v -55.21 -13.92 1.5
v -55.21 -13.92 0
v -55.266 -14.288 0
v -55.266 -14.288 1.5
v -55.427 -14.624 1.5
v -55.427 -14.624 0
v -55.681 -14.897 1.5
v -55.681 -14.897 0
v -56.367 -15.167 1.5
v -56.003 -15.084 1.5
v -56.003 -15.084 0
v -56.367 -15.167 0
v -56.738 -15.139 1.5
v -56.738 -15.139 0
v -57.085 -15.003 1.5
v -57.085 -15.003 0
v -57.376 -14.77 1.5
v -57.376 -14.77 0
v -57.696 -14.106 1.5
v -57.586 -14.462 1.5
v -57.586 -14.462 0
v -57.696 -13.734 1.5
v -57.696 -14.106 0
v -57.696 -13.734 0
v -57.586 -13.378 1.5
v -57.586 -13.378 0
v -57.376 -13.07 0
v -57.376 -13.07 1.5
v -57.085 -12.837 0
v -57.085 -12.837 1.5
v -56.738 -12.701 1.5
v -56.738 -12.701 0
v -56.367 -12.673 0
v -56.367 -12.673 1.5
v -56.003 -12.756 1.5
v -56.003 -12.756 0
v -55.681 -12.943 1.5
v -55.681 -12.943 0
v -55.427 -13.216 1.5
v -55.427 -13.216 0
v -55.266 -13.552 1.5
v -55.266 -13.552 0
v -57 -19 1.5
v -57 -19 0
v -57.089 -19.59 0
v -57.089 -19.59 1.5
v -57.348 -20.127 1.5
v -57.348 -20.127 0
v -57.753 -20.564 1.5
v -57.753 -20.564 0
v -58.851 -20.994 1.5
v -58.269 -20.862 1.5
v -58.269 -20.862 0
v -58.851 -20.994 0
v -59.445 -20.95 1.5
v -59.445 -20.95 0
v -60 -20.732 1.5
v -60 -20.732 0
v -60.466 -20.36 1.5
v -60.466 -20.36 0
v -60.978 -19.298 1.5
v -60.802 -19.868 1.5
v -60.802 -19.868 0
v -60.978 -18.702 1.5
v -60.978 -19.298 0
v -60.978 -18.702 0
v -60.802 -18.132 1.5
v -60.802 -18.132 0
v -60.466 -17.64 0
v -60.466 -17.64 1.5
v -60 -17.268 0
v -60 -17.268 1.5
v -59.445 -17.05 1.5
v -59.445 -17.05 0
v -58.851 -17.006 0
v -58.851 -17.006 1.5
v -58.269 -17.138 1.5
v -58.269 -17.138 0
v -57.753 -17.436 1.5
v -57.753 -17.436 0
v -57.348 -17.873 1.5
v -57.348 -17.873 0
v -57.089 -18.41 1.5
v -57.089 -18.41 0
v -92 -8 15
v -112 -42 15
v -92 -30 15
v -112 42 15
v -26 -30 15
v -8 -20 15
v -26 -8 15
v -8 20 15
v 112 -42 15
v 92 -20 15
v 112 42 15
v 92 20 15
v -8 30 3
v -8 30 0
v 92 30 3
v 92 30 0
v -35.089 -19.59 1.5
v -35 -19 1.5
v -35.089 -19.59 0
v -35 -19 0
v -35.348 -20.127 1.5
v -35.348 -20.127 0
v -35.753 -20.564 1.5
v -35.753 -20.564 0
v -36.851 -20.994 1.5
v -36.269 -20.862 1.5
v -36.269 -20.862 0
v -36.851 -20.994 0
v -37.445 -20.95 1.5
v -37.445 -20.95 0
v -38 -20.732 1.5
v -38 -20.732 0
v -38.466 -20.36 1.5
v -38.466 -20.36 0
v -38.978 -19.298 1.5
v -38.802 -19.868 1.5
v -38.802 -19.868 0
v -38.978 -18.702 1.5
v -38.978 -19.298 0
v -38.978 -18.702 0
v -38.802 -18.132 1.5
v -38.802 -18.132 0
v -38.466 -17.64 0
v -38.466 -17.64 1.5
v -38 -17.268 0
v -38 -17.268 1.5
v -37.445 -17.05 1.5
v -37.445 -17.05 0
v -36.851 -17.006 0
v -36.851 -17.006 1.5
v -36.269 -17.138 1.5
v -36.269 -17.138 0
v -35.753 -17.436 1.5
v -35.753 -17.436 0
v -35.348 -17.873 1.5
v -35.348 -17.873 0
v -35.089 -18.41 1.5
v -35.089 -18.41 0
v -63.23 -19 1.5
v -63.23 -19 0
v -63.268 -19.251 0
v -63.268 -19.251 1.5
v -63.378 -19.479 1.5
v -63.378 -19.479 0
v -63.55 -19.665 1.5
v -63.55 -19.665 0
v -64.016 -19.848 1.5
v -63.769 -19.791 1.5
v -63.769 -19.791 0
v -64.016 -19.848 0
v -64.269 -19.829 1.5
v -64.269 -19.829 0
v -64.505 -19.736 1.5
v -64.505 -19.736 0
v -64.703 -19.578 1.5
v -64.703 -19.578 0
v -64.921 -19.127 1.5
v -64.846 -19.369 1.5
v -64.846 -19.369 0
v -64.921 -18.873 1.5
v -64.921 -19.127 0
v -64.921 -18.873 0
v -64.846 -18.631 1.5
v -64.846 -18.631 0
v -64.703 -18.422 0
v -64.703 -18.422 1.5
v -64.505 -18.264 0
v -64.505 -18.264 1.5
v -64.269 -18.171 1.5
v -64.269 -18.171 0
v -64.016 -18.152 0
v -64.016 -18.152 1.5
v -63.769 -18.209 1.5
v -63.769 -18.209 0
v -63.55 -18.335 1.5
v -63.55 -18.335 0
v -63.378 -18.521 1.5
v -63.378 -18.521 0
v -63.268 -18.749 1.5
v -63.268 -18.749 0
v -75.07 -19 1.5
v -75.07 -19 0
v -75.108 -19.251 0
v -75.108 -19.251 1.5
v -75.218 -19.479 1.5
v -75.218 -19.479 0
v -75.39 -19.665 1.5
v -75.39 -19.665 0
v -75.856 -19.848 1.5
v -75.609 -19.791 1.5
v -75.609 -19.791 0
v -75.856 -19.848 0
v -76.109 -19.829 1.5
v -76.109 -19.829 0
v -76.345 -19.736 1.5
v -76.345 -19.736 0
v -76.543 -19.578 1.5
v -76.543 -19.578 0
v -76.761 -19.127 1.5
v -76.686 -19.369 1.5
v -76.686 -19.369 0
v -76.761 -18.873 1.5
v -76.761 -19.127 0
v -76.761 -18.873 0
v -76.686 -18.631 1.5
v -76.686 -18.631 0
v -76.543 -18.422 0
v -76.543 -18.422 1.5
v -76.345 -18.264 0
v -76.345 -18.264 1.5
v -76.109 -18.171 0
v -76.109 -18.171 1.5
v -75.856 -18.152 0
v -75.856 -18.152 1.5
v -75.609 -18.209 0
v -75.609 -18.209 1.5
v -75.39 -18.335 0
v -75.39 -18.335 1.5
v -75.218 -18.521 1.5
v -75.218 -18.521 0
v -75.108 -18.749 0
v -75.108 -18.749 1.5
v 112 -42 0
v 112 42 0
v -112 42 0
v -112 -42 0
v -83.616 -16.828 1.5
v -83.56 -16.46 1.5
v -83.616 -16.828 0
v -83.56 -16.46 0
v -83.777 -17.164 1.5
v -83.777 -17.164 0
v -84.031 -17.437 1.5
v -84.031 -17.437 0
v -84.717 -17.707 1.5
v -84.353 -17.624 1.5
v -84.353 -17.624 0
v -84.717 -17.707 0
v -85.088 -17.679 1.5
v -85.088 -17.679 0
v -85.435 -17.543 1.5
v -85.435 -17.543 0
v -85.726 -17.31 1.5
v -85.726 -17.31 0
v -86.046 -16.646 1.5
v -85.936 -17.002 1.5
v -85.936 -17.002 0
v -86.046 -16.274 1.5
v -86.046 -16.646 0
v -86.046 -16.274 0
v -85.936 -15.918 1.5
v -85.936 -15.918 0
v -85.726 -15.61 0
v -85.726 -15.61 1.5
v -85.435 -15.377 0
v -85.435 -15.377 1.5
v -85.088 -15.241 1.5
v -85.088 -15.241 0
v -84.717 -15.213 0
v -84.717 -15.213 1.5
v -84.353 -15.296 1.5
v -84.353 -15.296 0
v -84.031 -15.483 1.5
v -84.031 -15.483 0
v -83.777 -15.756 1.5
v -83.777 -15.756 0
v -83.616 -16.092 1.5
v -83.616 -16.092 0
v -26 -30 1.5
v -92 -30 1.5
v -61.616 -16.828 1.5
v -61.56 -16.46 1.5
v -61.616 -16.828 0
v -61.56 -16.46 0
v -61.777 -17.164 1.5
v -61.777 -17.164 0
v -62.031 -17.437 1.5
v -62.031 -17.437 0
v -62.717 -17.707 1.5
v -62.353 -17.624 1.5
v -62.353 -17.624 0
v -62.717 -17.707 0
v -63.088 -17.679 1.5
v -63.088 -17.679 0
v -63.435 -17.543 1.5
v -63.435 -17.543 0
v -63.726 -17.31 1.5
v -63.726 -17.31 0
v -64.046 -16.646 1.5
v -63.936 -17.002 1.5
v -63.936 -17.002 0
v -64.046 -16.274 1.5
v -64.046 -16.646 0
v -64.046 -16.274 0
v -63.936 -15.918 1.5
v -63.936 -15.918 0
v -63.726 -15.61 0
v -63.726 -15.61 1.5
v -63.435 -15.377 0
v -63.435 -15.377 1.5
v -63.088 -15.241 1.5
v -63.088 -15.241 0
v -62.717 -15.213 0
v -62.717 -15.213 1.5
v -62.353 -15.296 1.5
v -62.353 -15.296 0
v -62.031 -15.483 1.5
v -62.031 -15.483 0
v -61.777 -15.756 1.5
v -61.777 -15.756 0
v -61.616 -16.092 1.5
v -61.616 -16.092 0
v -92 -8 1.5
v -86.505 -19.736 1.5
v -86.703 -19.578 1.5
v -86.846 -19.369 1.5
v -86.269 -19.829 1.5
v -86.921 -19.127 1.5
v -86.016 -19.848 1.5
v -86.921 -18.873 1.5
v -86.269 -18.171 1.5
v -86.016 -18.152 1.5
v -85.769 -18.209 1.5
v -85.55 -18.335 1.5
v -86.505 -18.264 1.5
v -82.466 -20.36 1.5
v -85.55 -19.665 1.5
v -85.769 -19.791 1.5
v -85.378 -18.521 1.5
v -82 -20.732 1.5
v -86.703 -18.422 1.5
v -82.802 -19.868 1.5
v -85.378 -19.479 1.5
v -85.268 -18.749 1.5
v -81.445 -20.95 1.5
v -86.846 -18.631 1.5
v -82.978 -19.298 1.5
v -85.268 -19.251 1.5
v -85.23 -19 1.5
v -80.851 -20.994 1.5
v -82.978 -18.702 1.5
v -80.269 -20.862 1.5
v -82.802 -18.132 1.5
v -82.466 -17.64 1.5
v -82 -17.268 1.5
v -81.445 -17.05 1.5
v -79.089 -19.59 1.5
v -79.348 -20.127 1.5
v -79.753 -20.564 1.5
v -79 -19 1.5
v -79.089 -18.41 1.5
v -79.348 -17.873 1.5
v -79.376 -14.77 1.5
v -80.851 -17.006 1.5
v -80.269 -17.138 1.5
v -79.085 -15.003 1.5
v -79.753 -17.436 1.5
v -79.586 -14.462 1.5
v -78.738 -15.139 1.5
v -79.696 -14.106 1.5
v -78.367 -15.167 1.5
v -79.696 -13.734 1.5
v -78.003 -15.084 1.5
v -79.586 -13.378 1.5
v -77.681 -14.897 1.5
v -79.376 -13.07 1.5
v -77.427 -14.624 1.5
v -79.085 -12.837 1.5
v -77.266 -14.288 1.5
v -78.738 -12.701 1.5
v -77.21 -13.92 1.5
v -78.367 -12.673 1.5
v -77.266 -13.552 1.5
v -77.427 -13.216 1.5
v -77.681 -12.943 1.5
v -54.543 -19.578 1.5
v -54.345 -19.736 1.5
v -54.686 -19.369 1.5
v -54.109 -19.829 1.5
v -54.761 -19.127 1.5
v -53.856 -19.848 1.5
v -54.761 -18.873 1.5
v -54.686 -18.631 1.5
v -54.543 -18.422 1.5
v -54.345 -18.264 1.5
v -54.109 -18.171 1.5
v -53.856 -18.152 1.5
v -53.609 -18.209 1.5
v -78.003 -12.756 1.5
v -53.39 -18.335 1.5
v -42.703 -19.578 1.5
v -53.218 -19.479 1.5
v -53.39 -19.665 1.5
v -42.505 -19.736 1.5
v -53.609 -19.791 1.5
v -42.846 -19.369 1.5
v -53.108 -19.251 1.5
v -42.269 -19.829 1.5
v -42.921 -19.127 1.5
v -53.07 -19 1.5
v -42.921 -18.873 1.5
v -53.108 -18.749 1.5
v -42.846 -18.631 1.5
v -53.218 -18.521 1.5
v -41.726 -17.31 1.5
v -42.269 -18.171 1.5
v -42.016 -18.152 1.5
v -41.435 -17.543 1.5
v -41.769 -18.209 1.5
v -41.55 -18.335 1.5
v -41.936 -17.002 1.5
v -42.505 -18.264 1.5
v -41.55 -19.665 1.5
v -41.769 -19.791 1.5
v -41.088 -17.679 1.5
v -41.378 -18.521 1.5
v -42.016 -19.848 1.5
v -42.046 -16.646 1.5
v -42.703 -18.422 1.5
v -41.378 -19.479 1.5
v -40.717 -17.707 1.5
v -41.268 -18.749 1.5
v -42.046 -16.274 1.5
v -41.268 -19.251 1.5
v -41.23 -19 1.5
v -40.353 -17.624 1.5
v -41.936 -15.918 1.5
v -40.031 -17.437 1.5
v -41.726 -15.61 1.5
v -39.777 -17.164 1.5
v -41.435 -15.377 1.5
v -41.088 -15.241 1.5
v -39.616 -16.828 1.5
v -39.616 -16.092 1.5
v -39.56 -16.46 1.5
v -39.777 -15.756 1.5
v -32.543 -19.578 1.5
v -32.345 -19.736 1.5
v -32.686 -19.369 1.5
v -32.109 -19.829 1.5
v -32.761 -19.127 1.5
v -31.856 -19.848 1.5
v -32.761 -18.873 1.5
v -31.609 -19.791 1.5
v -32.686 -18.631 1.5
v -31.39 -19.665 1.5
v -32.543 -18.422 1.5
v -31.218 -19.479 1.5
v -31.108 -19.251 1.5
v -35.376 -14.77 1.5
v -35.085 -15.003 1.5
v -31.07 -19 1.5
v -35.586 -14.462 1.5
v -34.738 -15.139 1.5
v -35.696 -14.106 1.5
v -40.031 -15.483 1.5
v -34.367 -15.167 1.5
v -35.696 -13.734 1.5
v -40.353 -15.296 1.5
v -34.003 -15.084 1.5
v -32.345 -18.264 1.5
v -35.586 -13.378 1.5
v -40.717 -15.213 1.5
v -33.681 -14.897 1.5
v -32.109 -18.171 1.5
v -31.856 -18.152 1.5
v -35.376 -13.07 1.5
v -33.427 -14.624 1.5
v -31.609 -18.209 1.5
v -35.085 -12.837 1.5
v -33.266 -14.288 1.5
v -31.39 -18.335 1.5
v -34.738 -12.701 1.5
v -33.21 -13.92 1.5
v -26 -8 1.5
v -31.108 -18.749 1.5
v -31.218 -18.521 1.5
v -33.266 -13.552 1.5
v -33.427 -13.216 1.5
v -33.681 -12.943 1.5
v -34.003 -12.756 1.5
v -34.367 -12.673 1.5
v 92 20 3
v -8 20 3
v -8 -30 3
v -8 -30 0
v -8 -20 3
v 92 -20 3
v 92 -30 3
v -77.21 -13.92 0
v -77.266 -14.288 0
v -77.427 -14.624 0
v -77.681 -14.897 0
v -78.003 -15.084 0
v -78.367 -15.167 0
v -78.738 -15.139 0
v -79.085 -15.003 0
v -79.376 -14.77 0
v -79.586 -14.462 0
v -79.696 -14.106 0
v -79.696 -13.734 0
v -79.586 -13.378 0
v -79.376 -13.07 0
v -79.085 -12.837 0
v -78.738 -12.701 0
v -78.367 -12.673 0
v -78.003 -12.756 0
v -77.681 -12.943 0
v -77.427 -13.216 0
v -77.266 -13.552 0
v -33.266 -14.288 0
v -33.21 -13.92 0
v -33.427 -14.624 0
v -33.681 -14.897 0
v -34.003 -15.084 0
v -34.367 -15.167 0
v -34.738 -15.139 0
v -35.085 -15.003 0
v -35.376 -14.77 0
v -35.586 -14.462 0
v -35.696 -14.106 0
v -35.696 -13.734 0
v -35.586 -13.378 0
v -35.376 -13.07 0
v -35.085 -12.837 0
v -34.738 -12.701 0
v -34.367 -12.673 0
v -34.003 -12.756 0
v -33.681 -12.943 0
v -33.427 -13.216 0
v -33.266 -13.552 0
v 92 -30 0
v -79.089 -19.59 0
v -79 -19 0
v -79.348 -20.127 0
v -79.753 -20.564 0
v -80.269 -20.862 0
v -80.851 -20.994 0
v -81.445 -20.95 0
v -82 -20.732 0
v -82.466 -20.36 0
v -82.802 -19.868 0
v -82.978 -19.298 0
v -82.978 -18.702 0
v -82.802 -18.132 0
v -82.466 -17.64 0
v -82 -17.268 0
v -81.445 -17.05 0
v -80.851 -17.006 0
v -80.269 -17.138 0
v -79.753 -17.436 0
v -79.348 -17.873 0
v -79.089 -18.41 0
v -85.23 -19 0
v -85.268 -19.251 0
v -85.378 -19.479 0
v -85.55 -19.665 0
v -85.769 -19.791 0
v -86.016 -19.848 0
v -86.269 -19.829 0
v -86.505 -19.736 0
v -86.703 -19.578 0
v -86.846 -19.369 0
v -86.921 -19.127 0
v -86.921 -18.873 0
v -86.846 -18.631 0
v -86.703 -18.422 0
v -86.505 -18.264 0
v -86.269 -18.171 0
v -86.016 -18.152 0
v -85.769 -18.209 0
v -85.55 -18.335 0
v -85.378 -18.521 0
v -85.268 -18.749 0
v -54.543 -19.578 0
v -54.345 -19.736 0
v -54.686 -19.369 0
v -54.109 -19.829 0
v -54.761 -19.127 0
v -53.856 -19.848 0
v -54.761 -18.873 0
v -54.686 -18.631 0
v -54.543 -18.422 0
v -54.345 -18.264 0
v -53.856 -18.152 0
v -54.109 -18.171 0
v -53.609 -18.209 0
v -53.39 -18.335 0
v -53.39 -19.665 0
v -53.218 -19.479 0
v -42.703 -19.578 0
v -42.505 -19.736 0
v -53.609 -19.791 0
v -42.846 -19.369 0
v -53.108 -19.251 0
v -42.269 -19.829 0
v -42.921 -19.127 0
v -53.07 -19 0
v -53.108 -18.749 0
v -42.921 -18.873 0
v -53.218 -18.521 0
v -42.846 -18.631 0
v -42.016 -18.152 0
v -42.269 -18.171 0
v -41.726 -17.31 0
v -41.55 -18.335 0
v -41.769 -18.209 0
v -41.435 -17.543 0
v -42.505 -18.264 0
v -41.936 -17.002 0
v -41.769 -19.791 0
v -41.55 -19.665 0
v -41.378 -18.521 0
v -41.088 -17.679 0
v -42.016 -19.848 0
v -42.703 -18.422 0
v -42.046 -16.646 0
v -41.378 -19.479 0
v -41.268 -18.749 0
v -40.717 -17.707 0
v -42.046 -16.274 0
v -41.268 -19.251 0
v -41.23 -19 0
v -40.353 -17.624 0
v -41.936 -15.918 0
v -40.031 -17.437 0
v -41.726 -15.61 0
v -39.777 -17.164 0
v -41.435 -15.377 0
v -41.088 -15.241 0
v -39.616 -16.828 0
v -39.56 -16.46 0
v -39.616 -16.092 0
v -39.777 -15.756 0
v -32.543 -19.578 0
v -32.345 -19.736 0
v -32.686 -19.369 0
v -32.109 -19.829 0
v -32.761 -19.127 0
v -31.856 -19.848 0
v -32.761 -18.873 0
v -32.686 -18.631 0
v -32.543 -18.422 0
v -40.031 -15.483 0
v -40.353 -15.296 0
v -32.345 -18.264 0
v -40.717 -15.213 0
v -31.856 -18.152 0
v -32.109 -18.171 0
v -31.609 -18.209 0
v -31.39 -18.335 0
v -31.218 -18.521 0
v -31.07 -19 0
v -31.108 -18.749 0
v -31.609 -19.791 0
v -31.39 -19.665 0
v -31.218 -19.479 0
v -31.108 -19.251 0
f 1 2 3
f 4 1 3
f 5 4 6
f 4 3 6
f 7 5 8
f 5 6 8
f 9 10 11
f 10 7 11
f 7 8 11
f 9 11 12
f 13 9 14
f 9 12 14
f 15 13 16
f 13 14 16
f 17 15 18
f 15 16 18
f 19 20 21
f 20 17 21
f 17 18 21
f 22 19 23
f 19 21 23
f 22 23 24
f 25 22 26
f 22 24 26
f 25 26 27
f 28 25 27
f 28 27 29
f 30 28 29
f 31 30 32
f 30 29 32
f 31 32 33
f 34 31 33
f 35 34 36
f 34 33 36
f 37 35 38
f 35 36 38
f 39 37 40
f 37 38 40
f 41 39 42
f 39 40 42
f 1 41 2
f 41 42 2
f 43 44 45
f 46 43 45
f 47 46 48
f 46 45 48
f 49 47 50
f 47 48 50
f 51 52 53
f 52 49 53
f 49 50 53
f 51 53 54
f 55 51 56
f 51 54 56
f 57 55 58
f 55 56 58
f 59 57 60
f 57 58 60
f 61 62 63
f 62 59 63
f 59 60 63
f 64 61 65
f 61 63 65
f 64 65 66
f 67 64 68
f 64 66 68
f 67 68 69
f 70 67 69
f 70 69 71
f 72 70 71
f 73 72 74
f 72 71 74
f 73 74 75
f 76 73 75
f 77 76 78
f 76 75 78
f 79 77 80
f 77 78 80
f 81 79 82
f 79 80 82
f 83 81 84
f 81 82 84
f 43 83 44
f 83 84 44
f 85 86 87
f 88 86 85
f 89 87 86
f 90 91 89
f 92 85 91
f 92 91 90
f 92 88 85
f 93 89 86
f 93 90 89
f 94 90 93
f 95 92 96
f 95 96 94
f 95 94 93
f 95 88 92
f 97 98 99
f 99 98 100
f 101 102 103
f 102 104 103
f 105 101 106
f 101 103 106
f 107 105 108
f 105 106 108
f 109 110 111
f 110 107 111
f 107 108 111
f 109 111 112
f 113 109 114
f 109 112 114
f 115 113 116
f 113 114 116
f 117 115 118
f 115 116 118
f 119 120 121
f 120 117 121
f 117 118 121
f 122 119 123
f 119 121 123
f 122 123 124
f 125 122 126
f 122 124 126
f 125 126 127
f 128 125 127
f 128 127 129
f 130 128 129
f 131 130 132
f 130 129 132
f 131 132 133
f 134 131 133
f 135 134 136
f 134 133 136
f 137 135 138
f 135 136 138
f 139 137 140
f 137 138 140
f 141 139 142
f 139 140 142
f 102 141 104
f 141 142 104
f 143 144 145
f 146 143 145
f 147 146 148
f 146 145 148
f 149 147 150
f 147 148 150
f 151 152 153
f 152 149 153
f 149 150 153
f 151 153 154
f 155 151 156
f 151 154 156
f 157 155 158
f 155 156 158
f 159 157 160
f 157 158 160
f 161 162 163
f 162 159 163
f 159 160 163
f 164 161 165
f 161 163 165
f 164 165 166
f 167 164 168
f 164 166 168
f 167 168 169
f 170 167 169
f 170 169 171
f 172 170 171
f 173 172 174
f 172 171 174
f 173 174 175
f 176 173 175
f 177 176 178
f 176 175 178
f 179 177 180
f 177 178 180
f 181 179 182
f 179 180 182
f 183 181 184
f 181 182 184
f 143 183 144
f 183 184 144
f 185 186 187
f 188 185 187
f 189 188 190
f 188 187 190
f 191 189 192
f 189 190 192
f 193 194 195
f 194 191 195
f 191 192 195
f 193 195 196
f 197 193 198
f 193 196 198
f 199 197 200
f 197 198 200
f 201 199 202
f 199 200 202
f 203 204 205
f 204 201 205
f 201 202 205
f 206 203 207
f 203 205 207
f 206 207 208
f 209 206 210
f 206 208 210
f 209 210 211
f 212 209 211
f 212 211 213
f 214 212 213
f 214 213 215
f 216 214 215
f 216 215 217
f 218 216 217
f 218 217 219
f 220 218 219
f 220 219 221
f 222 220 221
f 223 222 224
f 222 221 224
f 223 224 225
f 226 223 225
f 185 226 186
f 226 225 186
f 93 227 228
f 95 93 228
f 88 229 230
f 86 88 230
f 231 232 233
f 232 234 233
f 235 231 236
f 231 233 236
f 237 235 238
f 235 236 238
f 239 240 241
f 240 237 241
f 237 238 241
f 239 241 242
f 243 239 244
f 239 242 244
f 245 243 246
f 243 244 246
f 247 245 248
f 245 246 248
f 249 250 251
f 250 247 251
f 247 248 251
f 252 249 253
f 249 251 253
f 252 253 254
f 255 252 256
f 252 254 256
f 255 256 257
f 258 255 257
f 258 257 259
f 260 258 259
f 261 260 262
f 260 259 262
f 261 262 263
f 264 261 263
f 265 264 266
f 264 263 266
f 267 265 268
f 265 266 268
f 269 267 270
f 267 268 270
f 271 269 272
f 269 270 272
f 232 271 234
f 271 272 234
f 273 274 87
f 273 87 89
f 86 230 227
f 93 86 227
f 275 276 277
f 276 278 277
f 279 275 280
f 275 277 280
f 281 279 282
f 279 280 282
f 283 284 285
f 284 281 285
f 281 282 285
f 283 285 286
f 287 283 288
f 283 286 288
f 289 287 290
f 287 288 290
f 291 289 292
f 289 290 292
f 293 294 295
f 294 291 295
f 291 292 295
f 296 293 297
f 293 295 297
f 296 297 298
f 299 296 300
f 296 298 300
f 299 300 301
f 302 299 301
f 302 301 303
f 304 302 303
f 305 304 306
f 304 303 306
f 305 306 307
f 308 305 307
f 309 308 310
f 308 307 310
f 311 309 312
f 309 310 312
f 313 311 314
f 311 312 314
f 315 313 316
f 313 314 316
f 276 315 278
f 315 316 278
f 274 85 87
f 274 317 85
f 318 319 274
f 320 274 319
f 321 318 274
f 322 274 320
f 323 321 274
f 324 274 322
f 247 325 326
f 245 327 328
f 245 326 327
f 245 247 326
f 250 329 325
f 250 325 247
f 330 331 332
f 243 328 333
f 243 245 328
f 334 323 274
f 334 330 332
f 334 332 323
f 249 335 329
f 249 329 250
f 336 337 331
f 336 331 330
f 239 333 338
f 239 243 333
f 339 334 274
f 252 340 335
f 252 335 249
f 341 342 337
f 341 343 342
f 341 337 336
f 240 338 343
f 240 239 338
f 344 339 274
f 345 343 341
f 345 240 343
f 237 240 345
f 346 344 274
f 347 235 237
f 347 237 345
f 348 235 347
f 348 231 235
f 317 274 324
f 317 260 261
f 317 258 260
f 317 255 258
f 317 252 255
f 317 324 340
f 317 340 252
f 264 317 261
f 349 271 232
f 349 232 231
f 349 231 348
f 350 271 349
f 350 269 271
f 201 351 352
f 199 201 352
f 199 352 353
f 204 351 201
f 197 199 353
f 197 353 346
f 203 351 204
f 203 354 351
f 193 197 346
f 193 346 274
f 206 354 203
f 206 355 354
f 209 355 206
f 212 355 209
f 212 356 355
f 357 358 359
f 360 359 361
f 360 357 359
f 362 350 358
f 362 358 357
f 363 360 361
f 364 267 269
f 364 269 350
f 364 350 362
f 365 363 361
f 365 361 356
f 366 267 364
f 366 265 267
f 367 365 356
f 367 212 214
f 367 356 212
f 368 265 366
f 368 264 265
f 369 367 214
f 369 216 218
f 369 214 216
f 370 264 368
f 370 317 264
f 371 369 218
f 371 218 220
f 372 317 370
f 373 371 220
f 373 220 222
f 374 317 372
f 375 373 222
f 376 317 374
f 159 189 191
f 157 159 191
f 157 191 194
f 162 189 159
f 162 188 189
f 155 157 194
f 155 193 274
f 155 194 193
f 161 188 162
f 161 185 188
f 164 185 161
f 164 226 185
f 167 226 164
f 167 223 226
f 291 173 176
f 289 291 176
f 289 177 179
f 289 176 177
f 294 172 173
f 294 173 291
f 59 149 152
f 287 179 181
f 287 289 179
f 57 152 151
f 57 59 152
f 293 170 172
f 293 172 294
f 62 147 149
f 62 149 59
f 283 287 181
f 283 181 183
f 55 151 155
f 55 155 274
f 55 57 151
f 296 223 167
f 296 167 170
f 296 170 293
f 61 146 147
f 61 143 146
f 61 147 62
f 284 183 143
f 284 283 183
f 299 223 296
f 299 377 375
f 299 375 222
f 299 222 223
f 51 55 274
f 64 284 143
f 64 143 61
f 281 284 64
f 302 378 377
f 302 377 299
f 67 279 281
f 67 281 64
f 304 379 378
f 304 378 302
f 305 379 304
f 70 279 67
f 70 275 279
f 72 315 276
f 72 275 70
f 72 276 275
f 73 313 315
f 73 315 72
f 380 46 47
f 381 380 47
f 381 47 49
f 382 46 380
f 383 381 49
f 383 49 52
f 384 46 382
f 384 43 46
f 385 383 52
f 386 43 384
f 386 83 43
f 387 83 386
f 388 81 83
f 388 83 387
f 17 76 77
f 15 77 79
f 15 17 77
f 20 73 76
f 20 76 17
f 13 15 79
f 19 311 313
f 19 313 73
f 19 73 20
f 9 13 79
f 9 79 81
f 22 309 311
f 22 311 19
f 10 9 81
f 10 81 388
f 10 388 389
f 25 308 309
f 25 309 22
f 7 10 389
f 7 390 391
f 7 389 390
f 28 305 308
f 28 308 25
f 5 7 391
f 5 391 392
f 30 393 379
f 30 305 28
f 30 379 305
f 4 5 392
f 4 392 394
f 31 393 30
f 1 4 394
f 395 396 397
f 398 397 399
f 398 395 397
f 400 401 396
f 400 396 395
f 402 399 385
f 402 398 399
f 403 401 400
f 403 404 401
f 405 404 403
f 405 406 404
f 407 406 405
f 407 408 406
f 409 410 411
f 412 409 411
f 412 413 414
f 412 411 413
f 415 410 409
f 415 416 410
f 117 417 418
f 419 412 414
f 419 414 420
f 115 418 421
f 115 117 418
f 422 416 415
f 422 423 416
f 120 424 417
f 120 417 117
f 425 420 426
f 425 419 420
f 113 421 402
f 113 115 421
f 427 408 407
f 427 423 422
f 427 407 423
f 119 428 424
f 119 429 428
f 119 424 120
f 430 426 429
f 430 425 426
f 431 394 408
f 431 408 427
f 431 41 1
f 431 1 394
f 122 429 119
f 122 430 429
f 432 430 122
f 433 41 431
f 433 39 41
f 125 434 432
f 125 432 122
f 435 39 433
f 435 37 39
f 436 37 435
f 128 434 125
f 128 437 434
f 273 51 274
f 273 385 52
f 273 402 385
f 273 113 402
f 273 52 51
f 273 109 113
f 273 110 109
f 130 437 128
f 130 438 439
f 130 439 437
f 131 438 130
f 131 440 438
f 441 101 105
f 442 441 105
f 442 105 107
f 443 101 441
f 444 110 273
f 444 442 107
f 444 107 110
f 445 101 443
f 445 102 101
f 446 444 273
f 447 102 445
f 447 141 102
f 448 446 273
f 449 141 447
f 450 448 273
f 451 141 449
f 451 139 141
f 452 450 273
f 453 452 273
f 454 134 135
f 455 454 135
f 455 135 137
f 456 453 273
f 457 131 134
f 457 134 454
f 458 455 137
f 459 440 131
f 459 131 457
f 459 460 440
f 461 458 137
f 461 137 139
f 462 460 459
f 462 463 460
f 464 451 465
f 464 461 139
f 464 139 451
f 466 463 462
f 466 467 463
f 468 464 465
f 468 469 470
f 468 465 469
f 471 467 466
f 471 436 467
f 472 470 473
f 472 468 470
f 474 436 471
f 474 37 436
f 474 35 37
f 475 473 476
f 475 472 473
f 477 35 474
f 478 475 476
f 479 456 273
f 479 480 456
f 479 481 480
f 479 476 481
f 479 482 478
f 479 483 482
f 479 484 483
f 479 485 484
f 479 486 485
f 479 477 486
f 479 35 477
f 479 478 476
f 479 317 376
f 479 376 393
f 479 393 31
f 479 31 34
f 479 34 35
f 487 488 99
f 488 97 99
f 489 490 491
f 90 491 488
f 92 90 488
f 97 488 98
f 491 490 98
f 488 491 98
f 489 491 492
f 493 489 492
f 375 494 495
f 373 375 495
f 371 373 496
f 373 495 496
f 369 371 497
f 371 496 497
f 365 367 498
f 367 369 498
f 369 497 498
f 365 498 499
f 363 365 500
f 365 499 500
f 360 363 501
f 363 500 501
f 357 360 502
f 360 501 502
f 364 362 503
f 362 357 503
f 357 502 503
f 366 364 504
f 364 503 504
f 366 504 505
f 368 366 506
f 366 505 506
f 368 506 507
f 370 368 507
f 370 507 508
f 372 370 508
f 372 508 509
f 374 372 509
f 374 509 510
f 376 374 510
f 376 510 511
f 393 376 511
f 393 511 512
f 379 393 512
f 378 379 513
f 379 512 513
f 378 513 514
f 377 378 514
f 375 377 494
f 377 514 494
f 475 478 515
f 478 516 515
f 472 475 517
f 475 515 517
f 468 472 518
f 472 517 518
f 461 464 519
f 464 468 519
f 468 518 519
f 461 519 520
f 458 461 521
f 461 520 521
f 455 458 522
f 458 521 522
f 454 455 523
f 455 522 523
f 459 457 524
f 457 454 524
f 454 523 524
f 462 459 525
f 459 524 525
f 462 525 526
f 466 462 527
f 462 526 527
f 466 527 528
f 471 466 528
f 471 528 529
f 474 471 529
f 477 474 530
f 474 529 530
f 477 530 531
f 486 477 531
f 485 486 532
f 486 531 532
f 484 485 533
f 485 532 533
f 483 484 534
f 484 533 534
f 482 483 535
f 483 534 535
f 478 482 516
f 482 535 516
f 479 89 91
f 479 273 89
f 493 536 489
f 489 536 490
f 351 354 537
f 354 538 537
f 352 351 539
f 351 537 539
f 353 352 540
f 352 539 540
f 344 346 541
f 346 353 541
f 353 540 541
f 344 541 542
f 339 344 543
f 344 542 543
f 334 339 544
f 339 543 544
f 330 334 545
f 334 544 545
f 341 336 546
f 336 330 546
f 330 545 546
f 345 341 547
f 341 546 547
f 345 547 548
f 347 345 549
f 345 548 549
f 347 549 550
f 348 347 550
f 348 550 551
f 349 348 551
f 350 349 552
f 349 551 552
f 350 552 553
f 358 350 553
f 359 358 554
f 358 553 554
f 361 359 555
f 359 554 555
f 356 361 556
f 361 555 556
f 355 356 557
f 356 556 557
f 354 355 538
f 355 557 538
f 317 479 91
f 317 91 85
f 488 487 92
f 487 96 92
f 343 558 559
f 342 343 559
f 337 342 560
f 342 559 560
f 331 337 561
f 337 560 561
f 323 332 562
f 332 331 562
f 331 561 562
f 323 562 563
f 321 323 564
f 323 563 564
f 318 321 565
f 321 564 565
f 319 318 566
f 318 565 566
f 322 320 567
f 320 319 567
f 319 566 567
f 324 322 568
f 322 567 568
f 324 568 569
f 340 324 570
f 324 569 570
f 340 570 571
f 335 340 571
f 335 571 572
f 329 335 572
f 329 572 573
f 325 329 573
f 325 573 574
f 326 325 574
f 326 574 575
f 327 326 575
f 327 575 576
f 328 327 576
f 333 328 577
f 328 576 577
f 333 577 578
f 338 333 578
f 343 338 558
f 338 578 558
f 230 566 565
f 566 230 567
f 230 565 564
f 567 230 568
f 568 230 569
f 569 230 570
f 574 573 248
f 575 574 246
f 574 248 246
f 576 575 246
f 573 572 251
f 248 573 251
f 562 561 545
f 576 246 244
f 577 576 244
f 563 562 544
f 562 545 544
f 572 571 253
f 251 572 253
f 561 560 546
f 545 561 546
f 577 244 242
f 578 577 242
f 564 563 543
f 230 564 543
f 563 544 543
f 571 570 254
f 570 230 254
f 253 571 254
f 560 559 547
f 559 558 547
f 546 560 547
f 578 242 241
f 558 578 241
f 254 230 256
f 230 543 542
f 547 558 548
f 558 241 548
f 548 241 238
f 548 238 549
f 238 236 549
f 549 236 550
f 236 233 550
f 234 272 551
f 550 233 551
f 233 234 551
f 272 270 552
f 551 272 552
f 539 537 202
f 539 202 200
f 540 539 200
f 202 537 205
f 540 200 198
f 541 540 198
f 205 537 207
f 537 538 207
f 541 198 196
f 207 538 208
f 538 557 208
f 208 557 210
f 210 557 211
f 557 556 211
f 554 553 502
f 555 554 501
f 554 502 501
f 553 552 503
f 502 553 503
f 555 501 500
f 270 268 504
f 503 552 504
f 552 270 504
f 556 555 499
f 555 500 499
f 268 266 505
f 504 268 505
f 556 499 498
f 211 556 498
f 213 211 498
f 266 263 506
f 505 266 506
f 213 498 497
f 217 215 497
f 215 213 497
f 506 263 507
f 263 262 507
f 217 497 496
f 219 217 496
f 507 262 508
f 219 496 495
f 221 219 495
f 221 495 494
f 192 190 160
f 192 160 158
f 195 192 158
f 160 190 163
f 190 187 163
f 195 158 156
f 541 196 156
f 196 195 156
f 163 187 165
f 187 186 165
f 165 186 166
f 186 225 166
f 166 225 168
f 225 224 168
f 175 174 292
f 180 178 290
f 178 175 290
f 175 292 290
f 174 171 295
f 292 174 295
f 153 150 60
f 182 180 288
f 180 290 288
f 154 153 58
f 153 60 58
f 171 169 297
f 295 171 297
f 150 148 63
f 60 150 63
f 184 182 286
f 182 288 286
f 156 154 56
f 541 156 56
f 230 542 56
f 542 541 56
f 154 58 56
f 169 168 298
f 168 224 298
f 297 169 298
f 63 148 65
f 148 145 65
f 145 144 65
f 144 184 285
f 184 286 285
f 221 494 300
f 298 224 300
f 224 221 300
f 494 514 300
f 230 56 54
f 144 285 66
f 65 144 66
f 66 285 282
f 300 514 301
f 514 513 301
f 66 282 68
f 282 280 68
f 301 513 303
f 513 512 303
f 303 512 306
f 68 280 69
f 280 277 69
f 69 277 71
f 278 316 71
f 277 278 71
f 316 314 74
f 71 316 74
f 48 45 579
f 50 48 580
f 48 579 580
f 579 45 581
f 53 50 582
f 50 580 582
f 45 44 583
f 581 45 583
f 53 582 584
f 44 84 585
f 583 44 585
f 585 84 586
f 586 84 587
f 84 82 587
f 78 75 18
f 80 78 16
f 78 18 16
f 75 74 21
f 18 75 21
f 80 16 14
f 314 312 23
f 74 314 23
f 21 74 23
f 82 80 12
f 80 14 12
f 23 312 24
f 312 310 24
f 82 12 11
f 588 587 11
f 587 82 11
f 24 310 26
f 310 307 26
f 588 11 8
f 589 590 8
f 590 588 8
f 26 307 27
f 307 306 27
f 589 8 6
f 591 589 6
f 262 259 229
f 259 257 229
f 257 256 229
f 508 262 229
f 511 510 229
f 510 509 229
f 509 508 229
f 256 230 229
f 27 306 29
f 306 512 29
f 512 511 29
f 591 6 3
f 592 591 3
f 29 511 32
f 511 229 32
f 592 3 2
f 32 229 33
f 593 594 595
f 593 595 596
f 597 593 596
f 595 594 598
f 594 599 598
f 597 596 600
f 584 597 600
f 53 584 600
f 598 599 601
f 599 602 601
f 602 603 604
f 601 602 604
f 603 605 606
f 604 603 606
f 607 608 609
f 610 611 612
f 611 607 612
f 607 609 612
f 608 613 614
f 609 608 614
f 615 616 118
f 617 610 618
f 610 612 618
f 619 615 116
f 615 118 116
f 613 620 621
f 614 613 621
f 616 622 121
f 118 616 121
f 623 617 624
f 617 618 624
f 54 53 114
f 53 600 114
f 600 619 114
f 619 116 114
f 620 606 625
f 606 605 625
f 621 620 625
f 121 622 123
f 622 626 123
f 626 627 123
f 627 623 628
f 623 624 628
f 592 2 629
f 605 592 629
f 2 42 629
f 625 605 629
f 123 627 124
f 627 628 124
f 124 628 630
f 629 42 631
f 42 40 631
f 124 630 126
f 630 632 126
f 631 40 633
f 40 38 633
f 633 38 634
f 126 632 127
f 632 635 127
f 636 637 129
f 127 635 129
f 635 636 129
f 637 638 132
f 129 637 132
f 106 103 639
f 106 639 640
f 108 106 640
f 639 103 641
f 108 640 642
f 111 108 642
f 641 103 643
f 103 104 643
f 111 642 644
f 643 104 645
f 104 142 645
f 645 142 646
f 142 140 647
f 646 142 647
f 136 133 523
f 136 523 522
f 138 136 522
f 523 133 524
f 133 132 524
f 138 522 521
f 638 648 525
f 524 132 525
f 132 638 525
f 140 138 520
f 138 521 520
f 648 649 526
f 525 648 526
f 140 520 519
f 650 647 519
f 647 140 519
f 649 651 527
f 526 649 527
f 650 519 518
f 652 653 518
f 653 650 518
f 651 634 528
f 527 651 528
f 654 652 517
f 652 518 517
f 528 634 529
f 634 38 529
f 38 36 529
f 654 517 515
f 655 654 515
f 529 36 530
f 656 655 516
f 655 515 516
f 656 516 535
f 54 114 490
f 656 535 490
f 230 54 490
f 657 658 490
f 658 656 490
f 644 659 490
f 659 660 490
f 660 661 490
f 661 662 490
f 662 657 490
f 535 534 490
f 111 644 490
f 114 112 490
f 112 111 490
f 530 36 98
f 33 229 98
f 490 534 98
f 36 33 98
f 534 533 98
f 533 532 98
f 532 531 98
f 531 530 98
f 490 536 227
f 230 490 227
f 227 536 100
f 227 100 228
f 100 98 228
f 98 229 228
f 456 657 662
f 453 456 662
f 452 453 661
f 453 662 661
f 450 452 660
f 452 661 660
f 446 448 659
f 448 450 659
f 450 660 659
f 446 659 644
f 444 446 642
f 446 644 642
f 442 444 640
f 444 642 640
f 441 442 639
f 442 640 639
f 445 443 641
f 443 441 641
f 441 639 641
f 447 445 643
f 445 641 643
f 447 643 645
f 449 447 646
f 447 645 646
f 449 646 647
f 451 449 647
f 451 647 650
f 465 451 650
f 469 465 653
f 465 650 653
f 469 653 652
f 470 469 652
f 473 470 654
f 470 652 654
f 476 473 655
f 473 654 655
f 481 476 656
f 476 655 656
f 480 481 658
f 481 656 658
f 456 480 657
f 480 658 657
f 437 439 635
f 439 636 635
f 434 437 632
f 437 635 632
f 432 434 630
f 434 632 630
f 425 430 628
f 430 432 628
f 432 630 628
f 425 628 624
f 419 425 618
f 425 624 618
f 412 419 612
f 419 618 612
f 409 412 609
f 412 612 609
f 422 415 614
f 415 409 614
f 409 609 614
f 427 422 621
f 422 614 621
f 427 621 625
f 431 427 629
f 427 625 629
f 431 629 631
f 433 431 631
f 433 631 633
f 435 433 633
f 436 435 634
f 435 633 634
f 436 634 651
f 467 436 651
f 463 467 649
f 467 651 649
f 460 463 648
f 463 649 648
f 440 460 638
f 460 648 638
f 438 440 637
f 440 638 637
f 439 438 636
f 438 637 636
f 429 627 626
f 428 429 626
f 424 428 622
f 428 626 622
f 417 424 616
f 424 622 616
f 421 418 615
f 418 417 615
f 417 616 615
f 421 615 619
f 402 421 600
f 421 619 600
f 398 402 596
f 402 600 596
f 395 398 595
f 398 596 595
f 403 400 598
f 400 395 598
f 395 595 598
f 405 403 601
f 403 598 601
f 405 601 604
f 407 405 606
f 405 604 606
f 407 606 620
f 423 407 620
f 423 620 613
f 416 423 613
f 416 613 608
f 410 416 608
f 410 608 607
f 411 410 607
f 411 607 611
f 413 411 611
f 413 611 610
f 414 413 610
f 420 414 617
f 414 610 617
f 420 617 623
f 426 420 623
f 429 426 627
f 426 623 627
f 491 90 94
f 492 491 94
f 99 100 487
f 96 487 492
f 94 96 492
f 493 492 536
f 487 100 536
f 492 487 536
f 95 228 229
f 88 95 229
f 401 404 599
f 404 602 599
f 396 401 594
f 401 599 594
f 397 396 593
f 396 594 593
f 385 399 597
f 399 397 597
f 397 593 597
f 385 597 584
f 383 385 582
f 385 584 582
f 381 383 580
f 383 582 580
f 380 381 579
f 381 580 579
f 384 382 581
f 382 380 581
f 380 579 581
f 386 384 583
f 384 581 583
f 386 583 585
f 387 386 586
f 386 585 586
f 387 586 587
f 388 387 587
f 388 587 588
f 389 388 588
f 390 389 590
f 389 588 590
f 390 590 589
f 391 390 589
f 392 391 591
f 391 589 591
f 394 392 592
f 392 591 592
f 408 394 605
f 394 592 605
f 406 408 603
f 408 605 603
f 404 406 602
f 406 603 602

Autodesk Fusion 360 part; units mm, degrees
sketch "Sketch1" plane through (0, 0, 0) normal (0, 0, 1) x (1, 0, 0)
  line L0 (112, 42) -> (-112, 42)
  line L1 (-112, 42) -> (-112, -42)
  line L2 (-112, -42) -> (112, -42)
  line L3 (112, -42) -> (112, 42)
  line L4 (112, 42) -> (-112, -42) construction
  line L5 (-112, 42) -> (112, -42) construction
  line L6 (-8, 30) -> (92, 30)
  line L7 (92, 30) -> (92, -30)
  line L8 (92, -30) -> (-8, -30)
  line L9 (-8, -30) -> (-8, 30)
  line L10 (-8, 30) -> (92, -30) construction
  line L11 (92, 30) -> (-8, -30) construction
  line L12 (92, 20) -> (-8, 20)
  line L13 (-8, 20) -> (-8, -20)
  line L14 (-8, -20) -> (92, -20)
  line L15 (92, -20) -> (92, 20)
  line L16 (92, 20) -> (-8, -20) construction
  line L17 (-8, 20) -> (92, -20) construction
  line L18 (92, 42) -> (92, -42) construction
  line L19 (-81, -19) -> (-78.46, -19) construction
  line L20 (-81, -13.92) -> (-81, -19) construction
  circle A0 centre (-75.92, -19) radius 0.85
  line L21 (-81, -16.46) -> (-81, -19) construction
  line L22 (-84.81, -19) -> (-84.81, -16.46) construction
  line L23 (-78.46, -13.92) -> (-81, -13.92) construction
  circle A1 centre (-78.46, -13.92) radius 1.25
  circle A2 centre (-86.08, -19) radius 0.85
  circle A3 centre (-81, -19) radius 2
  circle A4 centre (-84.81, -16.46) radius 1.25
  line L24 (-78.46, -19) -> (-78.46, -13.92) construction
  line L25 (-81, -19) -> (-75.92, -19) construction
  line L26 (-81, -19) -> (-84.81, -19) construction
  line L27 (-84.81, -16.46) -> (-81, -16.46) construction
  line L28 (-70, -8) -> (-92, -8)
  line L29 (-92, -8) -> (-92, -30)
  line L30 (-92, -30) -> (-70, -30)
  line L31 (-70, -30) -> (-70, -8) construction
  line L32 (-70, -8) -> (-92, -30) construction
  line L33 (-92, -8) -> (-70, -30) construction
  circle A5 centre (-53.92, -19) radius 0.85
  line L34 (-56.46, -19) -> (-56.46, -13.92) construction
  circle A6 centre (-64.08, -19) radius 0.85
  circle A7 centre (-62.81, -16.46) radius 1.25
  line L35 (-59, -16.46) -> (-59, -19) construction
  line L36 (-48, -30) -> (-48, -8) construction
  line L37 (-59, -19) -> (-53.92, -19) construction
  line L38 (-70, -8) -> (-48, -30) construction
  line L39 (-56.46, -13.92) -> (-59, -13.92) construction
  line L40 (-70, -8) -> (-70, -30) construction
  circle A8 centre (-56.46, -13.92) radius 1.25
  circle A9 centre (-59, -19) radius 2
  line L41 (-59, -19) -> (-56.46, -19) construction
  line L42 (-48, -8) -> (-70, -8)
  line L43 (-59, -13.92) -> (-59, -19) construction
  line L44 (-48, -8) -> (-70, -30) construction
  line L45 (-70, -30) -> (-48, -30)
  line L46 (-62.81, -19) -> (-62.81, -16.46) construction
  line L47 (-59, -19) -> (-62.81, -19) construction
  line L48 (-62.81, -16.46) -> (-59, -16.46) construction
  circle A10 centre (-31.92, -19) radius 0.85
  line L49 (-34.46, -19) -> (-34.46, -13.92) construction
  circle A11 centre (-42.08, -19) radius 0.85
  circle A12 centre (-40.81, -16.46) radius 1.25
  line L50 (-37, -16.46) -> (-37, -19) construction
  line L51 (-26, -30) -> (-26, -8)
  line L52 (-37, -19) -> (-31.92, -19) construction
  line L53 (-48, -8) -> (-26, -30) construction
  line L54 (-34.46, -13.92) -> (-37, -13.92) construction
  line L55 (-48, -8) -> (-48, -30) construction
  circle A13 centre (-34.46, -13.92) radius 1.25
  circle A14 centre (-37, -19) radius 2
  line L56 (-37, -19) -> (-34.46, -19) construction
  line L57 (-26, -8) -> (-48, -8)
  line L58 (-37, -13.92) -> (-37, -19) construction
  line L59 (-26, -8) -> (-48, -30) construction
  line L60 (-48, -30) -> (-26, -30)
  line L61 (-40.81, -19) -> (-40.81, -16.46) construction
  line L62 (-37, -19) -> (-40.81, -19) construction
  line L63 (-40.81, -16.46) -> (-37, -16.46) construction
  line L64 (-92, -30) -> (-112, -30) construction
  line L65 (-112, -30) -> (-112, -42) construction
  line L66 (-112, -42) -> (-92, -42) construction
  line L67 (-92, -42) -> (-92, -30) construction
  point P0 (42, 0)
  point P1 (42, 0)
  point P2 (-81, -19)
  point P3 (-81, -19)
  point P4 (-81, -19)
  point P5 (-59, -19)
  point P6 (-59, -19)
  point P7 (-59, -19)
  point P8 (-37, -19)
  point P9 (-37, -19)
  point P10 (-37, -19)
  dimension "d1" = 224
  dimension "d2" = 84
  dimension "d3" = 100
  dimension "d4" = 60
  dimension "d5" = 100
  dimension "d6" = 40
  dimension "d7" = 4
  dimension "d8" = 5.08
  dimension "d9" = 1.7
  dimension "d10" = 2.54
  dimension "d11" = 5.08
  dimension "d12" = 2.5
  dimension "d13" = 3.81
  dimension "d14" = 2.54
  dimension "d15" = 2.5
  dimension "d16" = 22
  dimension "d17" = 22
  dimension "d20" = 44
  dimension "d21" = 0
  dimension "d22" = 20
  dimension "d23" = 12
  dimension "d24" = 20
extrude "Extrude1" add sketch "Sketch1" along normal blind 15 contours L0 L1 L2 L3
extrude "Extrude2" add sketch "Sketch1" along normal blind 1.5 contours L28 L29 L30 L42 L45 L51 L57 L60
extrude "Extrude3" add sketch "Sketch1" against normal blind 12 from surface at 15 contours L6 L7 L9 L12 | L7 L8 L9 L14
